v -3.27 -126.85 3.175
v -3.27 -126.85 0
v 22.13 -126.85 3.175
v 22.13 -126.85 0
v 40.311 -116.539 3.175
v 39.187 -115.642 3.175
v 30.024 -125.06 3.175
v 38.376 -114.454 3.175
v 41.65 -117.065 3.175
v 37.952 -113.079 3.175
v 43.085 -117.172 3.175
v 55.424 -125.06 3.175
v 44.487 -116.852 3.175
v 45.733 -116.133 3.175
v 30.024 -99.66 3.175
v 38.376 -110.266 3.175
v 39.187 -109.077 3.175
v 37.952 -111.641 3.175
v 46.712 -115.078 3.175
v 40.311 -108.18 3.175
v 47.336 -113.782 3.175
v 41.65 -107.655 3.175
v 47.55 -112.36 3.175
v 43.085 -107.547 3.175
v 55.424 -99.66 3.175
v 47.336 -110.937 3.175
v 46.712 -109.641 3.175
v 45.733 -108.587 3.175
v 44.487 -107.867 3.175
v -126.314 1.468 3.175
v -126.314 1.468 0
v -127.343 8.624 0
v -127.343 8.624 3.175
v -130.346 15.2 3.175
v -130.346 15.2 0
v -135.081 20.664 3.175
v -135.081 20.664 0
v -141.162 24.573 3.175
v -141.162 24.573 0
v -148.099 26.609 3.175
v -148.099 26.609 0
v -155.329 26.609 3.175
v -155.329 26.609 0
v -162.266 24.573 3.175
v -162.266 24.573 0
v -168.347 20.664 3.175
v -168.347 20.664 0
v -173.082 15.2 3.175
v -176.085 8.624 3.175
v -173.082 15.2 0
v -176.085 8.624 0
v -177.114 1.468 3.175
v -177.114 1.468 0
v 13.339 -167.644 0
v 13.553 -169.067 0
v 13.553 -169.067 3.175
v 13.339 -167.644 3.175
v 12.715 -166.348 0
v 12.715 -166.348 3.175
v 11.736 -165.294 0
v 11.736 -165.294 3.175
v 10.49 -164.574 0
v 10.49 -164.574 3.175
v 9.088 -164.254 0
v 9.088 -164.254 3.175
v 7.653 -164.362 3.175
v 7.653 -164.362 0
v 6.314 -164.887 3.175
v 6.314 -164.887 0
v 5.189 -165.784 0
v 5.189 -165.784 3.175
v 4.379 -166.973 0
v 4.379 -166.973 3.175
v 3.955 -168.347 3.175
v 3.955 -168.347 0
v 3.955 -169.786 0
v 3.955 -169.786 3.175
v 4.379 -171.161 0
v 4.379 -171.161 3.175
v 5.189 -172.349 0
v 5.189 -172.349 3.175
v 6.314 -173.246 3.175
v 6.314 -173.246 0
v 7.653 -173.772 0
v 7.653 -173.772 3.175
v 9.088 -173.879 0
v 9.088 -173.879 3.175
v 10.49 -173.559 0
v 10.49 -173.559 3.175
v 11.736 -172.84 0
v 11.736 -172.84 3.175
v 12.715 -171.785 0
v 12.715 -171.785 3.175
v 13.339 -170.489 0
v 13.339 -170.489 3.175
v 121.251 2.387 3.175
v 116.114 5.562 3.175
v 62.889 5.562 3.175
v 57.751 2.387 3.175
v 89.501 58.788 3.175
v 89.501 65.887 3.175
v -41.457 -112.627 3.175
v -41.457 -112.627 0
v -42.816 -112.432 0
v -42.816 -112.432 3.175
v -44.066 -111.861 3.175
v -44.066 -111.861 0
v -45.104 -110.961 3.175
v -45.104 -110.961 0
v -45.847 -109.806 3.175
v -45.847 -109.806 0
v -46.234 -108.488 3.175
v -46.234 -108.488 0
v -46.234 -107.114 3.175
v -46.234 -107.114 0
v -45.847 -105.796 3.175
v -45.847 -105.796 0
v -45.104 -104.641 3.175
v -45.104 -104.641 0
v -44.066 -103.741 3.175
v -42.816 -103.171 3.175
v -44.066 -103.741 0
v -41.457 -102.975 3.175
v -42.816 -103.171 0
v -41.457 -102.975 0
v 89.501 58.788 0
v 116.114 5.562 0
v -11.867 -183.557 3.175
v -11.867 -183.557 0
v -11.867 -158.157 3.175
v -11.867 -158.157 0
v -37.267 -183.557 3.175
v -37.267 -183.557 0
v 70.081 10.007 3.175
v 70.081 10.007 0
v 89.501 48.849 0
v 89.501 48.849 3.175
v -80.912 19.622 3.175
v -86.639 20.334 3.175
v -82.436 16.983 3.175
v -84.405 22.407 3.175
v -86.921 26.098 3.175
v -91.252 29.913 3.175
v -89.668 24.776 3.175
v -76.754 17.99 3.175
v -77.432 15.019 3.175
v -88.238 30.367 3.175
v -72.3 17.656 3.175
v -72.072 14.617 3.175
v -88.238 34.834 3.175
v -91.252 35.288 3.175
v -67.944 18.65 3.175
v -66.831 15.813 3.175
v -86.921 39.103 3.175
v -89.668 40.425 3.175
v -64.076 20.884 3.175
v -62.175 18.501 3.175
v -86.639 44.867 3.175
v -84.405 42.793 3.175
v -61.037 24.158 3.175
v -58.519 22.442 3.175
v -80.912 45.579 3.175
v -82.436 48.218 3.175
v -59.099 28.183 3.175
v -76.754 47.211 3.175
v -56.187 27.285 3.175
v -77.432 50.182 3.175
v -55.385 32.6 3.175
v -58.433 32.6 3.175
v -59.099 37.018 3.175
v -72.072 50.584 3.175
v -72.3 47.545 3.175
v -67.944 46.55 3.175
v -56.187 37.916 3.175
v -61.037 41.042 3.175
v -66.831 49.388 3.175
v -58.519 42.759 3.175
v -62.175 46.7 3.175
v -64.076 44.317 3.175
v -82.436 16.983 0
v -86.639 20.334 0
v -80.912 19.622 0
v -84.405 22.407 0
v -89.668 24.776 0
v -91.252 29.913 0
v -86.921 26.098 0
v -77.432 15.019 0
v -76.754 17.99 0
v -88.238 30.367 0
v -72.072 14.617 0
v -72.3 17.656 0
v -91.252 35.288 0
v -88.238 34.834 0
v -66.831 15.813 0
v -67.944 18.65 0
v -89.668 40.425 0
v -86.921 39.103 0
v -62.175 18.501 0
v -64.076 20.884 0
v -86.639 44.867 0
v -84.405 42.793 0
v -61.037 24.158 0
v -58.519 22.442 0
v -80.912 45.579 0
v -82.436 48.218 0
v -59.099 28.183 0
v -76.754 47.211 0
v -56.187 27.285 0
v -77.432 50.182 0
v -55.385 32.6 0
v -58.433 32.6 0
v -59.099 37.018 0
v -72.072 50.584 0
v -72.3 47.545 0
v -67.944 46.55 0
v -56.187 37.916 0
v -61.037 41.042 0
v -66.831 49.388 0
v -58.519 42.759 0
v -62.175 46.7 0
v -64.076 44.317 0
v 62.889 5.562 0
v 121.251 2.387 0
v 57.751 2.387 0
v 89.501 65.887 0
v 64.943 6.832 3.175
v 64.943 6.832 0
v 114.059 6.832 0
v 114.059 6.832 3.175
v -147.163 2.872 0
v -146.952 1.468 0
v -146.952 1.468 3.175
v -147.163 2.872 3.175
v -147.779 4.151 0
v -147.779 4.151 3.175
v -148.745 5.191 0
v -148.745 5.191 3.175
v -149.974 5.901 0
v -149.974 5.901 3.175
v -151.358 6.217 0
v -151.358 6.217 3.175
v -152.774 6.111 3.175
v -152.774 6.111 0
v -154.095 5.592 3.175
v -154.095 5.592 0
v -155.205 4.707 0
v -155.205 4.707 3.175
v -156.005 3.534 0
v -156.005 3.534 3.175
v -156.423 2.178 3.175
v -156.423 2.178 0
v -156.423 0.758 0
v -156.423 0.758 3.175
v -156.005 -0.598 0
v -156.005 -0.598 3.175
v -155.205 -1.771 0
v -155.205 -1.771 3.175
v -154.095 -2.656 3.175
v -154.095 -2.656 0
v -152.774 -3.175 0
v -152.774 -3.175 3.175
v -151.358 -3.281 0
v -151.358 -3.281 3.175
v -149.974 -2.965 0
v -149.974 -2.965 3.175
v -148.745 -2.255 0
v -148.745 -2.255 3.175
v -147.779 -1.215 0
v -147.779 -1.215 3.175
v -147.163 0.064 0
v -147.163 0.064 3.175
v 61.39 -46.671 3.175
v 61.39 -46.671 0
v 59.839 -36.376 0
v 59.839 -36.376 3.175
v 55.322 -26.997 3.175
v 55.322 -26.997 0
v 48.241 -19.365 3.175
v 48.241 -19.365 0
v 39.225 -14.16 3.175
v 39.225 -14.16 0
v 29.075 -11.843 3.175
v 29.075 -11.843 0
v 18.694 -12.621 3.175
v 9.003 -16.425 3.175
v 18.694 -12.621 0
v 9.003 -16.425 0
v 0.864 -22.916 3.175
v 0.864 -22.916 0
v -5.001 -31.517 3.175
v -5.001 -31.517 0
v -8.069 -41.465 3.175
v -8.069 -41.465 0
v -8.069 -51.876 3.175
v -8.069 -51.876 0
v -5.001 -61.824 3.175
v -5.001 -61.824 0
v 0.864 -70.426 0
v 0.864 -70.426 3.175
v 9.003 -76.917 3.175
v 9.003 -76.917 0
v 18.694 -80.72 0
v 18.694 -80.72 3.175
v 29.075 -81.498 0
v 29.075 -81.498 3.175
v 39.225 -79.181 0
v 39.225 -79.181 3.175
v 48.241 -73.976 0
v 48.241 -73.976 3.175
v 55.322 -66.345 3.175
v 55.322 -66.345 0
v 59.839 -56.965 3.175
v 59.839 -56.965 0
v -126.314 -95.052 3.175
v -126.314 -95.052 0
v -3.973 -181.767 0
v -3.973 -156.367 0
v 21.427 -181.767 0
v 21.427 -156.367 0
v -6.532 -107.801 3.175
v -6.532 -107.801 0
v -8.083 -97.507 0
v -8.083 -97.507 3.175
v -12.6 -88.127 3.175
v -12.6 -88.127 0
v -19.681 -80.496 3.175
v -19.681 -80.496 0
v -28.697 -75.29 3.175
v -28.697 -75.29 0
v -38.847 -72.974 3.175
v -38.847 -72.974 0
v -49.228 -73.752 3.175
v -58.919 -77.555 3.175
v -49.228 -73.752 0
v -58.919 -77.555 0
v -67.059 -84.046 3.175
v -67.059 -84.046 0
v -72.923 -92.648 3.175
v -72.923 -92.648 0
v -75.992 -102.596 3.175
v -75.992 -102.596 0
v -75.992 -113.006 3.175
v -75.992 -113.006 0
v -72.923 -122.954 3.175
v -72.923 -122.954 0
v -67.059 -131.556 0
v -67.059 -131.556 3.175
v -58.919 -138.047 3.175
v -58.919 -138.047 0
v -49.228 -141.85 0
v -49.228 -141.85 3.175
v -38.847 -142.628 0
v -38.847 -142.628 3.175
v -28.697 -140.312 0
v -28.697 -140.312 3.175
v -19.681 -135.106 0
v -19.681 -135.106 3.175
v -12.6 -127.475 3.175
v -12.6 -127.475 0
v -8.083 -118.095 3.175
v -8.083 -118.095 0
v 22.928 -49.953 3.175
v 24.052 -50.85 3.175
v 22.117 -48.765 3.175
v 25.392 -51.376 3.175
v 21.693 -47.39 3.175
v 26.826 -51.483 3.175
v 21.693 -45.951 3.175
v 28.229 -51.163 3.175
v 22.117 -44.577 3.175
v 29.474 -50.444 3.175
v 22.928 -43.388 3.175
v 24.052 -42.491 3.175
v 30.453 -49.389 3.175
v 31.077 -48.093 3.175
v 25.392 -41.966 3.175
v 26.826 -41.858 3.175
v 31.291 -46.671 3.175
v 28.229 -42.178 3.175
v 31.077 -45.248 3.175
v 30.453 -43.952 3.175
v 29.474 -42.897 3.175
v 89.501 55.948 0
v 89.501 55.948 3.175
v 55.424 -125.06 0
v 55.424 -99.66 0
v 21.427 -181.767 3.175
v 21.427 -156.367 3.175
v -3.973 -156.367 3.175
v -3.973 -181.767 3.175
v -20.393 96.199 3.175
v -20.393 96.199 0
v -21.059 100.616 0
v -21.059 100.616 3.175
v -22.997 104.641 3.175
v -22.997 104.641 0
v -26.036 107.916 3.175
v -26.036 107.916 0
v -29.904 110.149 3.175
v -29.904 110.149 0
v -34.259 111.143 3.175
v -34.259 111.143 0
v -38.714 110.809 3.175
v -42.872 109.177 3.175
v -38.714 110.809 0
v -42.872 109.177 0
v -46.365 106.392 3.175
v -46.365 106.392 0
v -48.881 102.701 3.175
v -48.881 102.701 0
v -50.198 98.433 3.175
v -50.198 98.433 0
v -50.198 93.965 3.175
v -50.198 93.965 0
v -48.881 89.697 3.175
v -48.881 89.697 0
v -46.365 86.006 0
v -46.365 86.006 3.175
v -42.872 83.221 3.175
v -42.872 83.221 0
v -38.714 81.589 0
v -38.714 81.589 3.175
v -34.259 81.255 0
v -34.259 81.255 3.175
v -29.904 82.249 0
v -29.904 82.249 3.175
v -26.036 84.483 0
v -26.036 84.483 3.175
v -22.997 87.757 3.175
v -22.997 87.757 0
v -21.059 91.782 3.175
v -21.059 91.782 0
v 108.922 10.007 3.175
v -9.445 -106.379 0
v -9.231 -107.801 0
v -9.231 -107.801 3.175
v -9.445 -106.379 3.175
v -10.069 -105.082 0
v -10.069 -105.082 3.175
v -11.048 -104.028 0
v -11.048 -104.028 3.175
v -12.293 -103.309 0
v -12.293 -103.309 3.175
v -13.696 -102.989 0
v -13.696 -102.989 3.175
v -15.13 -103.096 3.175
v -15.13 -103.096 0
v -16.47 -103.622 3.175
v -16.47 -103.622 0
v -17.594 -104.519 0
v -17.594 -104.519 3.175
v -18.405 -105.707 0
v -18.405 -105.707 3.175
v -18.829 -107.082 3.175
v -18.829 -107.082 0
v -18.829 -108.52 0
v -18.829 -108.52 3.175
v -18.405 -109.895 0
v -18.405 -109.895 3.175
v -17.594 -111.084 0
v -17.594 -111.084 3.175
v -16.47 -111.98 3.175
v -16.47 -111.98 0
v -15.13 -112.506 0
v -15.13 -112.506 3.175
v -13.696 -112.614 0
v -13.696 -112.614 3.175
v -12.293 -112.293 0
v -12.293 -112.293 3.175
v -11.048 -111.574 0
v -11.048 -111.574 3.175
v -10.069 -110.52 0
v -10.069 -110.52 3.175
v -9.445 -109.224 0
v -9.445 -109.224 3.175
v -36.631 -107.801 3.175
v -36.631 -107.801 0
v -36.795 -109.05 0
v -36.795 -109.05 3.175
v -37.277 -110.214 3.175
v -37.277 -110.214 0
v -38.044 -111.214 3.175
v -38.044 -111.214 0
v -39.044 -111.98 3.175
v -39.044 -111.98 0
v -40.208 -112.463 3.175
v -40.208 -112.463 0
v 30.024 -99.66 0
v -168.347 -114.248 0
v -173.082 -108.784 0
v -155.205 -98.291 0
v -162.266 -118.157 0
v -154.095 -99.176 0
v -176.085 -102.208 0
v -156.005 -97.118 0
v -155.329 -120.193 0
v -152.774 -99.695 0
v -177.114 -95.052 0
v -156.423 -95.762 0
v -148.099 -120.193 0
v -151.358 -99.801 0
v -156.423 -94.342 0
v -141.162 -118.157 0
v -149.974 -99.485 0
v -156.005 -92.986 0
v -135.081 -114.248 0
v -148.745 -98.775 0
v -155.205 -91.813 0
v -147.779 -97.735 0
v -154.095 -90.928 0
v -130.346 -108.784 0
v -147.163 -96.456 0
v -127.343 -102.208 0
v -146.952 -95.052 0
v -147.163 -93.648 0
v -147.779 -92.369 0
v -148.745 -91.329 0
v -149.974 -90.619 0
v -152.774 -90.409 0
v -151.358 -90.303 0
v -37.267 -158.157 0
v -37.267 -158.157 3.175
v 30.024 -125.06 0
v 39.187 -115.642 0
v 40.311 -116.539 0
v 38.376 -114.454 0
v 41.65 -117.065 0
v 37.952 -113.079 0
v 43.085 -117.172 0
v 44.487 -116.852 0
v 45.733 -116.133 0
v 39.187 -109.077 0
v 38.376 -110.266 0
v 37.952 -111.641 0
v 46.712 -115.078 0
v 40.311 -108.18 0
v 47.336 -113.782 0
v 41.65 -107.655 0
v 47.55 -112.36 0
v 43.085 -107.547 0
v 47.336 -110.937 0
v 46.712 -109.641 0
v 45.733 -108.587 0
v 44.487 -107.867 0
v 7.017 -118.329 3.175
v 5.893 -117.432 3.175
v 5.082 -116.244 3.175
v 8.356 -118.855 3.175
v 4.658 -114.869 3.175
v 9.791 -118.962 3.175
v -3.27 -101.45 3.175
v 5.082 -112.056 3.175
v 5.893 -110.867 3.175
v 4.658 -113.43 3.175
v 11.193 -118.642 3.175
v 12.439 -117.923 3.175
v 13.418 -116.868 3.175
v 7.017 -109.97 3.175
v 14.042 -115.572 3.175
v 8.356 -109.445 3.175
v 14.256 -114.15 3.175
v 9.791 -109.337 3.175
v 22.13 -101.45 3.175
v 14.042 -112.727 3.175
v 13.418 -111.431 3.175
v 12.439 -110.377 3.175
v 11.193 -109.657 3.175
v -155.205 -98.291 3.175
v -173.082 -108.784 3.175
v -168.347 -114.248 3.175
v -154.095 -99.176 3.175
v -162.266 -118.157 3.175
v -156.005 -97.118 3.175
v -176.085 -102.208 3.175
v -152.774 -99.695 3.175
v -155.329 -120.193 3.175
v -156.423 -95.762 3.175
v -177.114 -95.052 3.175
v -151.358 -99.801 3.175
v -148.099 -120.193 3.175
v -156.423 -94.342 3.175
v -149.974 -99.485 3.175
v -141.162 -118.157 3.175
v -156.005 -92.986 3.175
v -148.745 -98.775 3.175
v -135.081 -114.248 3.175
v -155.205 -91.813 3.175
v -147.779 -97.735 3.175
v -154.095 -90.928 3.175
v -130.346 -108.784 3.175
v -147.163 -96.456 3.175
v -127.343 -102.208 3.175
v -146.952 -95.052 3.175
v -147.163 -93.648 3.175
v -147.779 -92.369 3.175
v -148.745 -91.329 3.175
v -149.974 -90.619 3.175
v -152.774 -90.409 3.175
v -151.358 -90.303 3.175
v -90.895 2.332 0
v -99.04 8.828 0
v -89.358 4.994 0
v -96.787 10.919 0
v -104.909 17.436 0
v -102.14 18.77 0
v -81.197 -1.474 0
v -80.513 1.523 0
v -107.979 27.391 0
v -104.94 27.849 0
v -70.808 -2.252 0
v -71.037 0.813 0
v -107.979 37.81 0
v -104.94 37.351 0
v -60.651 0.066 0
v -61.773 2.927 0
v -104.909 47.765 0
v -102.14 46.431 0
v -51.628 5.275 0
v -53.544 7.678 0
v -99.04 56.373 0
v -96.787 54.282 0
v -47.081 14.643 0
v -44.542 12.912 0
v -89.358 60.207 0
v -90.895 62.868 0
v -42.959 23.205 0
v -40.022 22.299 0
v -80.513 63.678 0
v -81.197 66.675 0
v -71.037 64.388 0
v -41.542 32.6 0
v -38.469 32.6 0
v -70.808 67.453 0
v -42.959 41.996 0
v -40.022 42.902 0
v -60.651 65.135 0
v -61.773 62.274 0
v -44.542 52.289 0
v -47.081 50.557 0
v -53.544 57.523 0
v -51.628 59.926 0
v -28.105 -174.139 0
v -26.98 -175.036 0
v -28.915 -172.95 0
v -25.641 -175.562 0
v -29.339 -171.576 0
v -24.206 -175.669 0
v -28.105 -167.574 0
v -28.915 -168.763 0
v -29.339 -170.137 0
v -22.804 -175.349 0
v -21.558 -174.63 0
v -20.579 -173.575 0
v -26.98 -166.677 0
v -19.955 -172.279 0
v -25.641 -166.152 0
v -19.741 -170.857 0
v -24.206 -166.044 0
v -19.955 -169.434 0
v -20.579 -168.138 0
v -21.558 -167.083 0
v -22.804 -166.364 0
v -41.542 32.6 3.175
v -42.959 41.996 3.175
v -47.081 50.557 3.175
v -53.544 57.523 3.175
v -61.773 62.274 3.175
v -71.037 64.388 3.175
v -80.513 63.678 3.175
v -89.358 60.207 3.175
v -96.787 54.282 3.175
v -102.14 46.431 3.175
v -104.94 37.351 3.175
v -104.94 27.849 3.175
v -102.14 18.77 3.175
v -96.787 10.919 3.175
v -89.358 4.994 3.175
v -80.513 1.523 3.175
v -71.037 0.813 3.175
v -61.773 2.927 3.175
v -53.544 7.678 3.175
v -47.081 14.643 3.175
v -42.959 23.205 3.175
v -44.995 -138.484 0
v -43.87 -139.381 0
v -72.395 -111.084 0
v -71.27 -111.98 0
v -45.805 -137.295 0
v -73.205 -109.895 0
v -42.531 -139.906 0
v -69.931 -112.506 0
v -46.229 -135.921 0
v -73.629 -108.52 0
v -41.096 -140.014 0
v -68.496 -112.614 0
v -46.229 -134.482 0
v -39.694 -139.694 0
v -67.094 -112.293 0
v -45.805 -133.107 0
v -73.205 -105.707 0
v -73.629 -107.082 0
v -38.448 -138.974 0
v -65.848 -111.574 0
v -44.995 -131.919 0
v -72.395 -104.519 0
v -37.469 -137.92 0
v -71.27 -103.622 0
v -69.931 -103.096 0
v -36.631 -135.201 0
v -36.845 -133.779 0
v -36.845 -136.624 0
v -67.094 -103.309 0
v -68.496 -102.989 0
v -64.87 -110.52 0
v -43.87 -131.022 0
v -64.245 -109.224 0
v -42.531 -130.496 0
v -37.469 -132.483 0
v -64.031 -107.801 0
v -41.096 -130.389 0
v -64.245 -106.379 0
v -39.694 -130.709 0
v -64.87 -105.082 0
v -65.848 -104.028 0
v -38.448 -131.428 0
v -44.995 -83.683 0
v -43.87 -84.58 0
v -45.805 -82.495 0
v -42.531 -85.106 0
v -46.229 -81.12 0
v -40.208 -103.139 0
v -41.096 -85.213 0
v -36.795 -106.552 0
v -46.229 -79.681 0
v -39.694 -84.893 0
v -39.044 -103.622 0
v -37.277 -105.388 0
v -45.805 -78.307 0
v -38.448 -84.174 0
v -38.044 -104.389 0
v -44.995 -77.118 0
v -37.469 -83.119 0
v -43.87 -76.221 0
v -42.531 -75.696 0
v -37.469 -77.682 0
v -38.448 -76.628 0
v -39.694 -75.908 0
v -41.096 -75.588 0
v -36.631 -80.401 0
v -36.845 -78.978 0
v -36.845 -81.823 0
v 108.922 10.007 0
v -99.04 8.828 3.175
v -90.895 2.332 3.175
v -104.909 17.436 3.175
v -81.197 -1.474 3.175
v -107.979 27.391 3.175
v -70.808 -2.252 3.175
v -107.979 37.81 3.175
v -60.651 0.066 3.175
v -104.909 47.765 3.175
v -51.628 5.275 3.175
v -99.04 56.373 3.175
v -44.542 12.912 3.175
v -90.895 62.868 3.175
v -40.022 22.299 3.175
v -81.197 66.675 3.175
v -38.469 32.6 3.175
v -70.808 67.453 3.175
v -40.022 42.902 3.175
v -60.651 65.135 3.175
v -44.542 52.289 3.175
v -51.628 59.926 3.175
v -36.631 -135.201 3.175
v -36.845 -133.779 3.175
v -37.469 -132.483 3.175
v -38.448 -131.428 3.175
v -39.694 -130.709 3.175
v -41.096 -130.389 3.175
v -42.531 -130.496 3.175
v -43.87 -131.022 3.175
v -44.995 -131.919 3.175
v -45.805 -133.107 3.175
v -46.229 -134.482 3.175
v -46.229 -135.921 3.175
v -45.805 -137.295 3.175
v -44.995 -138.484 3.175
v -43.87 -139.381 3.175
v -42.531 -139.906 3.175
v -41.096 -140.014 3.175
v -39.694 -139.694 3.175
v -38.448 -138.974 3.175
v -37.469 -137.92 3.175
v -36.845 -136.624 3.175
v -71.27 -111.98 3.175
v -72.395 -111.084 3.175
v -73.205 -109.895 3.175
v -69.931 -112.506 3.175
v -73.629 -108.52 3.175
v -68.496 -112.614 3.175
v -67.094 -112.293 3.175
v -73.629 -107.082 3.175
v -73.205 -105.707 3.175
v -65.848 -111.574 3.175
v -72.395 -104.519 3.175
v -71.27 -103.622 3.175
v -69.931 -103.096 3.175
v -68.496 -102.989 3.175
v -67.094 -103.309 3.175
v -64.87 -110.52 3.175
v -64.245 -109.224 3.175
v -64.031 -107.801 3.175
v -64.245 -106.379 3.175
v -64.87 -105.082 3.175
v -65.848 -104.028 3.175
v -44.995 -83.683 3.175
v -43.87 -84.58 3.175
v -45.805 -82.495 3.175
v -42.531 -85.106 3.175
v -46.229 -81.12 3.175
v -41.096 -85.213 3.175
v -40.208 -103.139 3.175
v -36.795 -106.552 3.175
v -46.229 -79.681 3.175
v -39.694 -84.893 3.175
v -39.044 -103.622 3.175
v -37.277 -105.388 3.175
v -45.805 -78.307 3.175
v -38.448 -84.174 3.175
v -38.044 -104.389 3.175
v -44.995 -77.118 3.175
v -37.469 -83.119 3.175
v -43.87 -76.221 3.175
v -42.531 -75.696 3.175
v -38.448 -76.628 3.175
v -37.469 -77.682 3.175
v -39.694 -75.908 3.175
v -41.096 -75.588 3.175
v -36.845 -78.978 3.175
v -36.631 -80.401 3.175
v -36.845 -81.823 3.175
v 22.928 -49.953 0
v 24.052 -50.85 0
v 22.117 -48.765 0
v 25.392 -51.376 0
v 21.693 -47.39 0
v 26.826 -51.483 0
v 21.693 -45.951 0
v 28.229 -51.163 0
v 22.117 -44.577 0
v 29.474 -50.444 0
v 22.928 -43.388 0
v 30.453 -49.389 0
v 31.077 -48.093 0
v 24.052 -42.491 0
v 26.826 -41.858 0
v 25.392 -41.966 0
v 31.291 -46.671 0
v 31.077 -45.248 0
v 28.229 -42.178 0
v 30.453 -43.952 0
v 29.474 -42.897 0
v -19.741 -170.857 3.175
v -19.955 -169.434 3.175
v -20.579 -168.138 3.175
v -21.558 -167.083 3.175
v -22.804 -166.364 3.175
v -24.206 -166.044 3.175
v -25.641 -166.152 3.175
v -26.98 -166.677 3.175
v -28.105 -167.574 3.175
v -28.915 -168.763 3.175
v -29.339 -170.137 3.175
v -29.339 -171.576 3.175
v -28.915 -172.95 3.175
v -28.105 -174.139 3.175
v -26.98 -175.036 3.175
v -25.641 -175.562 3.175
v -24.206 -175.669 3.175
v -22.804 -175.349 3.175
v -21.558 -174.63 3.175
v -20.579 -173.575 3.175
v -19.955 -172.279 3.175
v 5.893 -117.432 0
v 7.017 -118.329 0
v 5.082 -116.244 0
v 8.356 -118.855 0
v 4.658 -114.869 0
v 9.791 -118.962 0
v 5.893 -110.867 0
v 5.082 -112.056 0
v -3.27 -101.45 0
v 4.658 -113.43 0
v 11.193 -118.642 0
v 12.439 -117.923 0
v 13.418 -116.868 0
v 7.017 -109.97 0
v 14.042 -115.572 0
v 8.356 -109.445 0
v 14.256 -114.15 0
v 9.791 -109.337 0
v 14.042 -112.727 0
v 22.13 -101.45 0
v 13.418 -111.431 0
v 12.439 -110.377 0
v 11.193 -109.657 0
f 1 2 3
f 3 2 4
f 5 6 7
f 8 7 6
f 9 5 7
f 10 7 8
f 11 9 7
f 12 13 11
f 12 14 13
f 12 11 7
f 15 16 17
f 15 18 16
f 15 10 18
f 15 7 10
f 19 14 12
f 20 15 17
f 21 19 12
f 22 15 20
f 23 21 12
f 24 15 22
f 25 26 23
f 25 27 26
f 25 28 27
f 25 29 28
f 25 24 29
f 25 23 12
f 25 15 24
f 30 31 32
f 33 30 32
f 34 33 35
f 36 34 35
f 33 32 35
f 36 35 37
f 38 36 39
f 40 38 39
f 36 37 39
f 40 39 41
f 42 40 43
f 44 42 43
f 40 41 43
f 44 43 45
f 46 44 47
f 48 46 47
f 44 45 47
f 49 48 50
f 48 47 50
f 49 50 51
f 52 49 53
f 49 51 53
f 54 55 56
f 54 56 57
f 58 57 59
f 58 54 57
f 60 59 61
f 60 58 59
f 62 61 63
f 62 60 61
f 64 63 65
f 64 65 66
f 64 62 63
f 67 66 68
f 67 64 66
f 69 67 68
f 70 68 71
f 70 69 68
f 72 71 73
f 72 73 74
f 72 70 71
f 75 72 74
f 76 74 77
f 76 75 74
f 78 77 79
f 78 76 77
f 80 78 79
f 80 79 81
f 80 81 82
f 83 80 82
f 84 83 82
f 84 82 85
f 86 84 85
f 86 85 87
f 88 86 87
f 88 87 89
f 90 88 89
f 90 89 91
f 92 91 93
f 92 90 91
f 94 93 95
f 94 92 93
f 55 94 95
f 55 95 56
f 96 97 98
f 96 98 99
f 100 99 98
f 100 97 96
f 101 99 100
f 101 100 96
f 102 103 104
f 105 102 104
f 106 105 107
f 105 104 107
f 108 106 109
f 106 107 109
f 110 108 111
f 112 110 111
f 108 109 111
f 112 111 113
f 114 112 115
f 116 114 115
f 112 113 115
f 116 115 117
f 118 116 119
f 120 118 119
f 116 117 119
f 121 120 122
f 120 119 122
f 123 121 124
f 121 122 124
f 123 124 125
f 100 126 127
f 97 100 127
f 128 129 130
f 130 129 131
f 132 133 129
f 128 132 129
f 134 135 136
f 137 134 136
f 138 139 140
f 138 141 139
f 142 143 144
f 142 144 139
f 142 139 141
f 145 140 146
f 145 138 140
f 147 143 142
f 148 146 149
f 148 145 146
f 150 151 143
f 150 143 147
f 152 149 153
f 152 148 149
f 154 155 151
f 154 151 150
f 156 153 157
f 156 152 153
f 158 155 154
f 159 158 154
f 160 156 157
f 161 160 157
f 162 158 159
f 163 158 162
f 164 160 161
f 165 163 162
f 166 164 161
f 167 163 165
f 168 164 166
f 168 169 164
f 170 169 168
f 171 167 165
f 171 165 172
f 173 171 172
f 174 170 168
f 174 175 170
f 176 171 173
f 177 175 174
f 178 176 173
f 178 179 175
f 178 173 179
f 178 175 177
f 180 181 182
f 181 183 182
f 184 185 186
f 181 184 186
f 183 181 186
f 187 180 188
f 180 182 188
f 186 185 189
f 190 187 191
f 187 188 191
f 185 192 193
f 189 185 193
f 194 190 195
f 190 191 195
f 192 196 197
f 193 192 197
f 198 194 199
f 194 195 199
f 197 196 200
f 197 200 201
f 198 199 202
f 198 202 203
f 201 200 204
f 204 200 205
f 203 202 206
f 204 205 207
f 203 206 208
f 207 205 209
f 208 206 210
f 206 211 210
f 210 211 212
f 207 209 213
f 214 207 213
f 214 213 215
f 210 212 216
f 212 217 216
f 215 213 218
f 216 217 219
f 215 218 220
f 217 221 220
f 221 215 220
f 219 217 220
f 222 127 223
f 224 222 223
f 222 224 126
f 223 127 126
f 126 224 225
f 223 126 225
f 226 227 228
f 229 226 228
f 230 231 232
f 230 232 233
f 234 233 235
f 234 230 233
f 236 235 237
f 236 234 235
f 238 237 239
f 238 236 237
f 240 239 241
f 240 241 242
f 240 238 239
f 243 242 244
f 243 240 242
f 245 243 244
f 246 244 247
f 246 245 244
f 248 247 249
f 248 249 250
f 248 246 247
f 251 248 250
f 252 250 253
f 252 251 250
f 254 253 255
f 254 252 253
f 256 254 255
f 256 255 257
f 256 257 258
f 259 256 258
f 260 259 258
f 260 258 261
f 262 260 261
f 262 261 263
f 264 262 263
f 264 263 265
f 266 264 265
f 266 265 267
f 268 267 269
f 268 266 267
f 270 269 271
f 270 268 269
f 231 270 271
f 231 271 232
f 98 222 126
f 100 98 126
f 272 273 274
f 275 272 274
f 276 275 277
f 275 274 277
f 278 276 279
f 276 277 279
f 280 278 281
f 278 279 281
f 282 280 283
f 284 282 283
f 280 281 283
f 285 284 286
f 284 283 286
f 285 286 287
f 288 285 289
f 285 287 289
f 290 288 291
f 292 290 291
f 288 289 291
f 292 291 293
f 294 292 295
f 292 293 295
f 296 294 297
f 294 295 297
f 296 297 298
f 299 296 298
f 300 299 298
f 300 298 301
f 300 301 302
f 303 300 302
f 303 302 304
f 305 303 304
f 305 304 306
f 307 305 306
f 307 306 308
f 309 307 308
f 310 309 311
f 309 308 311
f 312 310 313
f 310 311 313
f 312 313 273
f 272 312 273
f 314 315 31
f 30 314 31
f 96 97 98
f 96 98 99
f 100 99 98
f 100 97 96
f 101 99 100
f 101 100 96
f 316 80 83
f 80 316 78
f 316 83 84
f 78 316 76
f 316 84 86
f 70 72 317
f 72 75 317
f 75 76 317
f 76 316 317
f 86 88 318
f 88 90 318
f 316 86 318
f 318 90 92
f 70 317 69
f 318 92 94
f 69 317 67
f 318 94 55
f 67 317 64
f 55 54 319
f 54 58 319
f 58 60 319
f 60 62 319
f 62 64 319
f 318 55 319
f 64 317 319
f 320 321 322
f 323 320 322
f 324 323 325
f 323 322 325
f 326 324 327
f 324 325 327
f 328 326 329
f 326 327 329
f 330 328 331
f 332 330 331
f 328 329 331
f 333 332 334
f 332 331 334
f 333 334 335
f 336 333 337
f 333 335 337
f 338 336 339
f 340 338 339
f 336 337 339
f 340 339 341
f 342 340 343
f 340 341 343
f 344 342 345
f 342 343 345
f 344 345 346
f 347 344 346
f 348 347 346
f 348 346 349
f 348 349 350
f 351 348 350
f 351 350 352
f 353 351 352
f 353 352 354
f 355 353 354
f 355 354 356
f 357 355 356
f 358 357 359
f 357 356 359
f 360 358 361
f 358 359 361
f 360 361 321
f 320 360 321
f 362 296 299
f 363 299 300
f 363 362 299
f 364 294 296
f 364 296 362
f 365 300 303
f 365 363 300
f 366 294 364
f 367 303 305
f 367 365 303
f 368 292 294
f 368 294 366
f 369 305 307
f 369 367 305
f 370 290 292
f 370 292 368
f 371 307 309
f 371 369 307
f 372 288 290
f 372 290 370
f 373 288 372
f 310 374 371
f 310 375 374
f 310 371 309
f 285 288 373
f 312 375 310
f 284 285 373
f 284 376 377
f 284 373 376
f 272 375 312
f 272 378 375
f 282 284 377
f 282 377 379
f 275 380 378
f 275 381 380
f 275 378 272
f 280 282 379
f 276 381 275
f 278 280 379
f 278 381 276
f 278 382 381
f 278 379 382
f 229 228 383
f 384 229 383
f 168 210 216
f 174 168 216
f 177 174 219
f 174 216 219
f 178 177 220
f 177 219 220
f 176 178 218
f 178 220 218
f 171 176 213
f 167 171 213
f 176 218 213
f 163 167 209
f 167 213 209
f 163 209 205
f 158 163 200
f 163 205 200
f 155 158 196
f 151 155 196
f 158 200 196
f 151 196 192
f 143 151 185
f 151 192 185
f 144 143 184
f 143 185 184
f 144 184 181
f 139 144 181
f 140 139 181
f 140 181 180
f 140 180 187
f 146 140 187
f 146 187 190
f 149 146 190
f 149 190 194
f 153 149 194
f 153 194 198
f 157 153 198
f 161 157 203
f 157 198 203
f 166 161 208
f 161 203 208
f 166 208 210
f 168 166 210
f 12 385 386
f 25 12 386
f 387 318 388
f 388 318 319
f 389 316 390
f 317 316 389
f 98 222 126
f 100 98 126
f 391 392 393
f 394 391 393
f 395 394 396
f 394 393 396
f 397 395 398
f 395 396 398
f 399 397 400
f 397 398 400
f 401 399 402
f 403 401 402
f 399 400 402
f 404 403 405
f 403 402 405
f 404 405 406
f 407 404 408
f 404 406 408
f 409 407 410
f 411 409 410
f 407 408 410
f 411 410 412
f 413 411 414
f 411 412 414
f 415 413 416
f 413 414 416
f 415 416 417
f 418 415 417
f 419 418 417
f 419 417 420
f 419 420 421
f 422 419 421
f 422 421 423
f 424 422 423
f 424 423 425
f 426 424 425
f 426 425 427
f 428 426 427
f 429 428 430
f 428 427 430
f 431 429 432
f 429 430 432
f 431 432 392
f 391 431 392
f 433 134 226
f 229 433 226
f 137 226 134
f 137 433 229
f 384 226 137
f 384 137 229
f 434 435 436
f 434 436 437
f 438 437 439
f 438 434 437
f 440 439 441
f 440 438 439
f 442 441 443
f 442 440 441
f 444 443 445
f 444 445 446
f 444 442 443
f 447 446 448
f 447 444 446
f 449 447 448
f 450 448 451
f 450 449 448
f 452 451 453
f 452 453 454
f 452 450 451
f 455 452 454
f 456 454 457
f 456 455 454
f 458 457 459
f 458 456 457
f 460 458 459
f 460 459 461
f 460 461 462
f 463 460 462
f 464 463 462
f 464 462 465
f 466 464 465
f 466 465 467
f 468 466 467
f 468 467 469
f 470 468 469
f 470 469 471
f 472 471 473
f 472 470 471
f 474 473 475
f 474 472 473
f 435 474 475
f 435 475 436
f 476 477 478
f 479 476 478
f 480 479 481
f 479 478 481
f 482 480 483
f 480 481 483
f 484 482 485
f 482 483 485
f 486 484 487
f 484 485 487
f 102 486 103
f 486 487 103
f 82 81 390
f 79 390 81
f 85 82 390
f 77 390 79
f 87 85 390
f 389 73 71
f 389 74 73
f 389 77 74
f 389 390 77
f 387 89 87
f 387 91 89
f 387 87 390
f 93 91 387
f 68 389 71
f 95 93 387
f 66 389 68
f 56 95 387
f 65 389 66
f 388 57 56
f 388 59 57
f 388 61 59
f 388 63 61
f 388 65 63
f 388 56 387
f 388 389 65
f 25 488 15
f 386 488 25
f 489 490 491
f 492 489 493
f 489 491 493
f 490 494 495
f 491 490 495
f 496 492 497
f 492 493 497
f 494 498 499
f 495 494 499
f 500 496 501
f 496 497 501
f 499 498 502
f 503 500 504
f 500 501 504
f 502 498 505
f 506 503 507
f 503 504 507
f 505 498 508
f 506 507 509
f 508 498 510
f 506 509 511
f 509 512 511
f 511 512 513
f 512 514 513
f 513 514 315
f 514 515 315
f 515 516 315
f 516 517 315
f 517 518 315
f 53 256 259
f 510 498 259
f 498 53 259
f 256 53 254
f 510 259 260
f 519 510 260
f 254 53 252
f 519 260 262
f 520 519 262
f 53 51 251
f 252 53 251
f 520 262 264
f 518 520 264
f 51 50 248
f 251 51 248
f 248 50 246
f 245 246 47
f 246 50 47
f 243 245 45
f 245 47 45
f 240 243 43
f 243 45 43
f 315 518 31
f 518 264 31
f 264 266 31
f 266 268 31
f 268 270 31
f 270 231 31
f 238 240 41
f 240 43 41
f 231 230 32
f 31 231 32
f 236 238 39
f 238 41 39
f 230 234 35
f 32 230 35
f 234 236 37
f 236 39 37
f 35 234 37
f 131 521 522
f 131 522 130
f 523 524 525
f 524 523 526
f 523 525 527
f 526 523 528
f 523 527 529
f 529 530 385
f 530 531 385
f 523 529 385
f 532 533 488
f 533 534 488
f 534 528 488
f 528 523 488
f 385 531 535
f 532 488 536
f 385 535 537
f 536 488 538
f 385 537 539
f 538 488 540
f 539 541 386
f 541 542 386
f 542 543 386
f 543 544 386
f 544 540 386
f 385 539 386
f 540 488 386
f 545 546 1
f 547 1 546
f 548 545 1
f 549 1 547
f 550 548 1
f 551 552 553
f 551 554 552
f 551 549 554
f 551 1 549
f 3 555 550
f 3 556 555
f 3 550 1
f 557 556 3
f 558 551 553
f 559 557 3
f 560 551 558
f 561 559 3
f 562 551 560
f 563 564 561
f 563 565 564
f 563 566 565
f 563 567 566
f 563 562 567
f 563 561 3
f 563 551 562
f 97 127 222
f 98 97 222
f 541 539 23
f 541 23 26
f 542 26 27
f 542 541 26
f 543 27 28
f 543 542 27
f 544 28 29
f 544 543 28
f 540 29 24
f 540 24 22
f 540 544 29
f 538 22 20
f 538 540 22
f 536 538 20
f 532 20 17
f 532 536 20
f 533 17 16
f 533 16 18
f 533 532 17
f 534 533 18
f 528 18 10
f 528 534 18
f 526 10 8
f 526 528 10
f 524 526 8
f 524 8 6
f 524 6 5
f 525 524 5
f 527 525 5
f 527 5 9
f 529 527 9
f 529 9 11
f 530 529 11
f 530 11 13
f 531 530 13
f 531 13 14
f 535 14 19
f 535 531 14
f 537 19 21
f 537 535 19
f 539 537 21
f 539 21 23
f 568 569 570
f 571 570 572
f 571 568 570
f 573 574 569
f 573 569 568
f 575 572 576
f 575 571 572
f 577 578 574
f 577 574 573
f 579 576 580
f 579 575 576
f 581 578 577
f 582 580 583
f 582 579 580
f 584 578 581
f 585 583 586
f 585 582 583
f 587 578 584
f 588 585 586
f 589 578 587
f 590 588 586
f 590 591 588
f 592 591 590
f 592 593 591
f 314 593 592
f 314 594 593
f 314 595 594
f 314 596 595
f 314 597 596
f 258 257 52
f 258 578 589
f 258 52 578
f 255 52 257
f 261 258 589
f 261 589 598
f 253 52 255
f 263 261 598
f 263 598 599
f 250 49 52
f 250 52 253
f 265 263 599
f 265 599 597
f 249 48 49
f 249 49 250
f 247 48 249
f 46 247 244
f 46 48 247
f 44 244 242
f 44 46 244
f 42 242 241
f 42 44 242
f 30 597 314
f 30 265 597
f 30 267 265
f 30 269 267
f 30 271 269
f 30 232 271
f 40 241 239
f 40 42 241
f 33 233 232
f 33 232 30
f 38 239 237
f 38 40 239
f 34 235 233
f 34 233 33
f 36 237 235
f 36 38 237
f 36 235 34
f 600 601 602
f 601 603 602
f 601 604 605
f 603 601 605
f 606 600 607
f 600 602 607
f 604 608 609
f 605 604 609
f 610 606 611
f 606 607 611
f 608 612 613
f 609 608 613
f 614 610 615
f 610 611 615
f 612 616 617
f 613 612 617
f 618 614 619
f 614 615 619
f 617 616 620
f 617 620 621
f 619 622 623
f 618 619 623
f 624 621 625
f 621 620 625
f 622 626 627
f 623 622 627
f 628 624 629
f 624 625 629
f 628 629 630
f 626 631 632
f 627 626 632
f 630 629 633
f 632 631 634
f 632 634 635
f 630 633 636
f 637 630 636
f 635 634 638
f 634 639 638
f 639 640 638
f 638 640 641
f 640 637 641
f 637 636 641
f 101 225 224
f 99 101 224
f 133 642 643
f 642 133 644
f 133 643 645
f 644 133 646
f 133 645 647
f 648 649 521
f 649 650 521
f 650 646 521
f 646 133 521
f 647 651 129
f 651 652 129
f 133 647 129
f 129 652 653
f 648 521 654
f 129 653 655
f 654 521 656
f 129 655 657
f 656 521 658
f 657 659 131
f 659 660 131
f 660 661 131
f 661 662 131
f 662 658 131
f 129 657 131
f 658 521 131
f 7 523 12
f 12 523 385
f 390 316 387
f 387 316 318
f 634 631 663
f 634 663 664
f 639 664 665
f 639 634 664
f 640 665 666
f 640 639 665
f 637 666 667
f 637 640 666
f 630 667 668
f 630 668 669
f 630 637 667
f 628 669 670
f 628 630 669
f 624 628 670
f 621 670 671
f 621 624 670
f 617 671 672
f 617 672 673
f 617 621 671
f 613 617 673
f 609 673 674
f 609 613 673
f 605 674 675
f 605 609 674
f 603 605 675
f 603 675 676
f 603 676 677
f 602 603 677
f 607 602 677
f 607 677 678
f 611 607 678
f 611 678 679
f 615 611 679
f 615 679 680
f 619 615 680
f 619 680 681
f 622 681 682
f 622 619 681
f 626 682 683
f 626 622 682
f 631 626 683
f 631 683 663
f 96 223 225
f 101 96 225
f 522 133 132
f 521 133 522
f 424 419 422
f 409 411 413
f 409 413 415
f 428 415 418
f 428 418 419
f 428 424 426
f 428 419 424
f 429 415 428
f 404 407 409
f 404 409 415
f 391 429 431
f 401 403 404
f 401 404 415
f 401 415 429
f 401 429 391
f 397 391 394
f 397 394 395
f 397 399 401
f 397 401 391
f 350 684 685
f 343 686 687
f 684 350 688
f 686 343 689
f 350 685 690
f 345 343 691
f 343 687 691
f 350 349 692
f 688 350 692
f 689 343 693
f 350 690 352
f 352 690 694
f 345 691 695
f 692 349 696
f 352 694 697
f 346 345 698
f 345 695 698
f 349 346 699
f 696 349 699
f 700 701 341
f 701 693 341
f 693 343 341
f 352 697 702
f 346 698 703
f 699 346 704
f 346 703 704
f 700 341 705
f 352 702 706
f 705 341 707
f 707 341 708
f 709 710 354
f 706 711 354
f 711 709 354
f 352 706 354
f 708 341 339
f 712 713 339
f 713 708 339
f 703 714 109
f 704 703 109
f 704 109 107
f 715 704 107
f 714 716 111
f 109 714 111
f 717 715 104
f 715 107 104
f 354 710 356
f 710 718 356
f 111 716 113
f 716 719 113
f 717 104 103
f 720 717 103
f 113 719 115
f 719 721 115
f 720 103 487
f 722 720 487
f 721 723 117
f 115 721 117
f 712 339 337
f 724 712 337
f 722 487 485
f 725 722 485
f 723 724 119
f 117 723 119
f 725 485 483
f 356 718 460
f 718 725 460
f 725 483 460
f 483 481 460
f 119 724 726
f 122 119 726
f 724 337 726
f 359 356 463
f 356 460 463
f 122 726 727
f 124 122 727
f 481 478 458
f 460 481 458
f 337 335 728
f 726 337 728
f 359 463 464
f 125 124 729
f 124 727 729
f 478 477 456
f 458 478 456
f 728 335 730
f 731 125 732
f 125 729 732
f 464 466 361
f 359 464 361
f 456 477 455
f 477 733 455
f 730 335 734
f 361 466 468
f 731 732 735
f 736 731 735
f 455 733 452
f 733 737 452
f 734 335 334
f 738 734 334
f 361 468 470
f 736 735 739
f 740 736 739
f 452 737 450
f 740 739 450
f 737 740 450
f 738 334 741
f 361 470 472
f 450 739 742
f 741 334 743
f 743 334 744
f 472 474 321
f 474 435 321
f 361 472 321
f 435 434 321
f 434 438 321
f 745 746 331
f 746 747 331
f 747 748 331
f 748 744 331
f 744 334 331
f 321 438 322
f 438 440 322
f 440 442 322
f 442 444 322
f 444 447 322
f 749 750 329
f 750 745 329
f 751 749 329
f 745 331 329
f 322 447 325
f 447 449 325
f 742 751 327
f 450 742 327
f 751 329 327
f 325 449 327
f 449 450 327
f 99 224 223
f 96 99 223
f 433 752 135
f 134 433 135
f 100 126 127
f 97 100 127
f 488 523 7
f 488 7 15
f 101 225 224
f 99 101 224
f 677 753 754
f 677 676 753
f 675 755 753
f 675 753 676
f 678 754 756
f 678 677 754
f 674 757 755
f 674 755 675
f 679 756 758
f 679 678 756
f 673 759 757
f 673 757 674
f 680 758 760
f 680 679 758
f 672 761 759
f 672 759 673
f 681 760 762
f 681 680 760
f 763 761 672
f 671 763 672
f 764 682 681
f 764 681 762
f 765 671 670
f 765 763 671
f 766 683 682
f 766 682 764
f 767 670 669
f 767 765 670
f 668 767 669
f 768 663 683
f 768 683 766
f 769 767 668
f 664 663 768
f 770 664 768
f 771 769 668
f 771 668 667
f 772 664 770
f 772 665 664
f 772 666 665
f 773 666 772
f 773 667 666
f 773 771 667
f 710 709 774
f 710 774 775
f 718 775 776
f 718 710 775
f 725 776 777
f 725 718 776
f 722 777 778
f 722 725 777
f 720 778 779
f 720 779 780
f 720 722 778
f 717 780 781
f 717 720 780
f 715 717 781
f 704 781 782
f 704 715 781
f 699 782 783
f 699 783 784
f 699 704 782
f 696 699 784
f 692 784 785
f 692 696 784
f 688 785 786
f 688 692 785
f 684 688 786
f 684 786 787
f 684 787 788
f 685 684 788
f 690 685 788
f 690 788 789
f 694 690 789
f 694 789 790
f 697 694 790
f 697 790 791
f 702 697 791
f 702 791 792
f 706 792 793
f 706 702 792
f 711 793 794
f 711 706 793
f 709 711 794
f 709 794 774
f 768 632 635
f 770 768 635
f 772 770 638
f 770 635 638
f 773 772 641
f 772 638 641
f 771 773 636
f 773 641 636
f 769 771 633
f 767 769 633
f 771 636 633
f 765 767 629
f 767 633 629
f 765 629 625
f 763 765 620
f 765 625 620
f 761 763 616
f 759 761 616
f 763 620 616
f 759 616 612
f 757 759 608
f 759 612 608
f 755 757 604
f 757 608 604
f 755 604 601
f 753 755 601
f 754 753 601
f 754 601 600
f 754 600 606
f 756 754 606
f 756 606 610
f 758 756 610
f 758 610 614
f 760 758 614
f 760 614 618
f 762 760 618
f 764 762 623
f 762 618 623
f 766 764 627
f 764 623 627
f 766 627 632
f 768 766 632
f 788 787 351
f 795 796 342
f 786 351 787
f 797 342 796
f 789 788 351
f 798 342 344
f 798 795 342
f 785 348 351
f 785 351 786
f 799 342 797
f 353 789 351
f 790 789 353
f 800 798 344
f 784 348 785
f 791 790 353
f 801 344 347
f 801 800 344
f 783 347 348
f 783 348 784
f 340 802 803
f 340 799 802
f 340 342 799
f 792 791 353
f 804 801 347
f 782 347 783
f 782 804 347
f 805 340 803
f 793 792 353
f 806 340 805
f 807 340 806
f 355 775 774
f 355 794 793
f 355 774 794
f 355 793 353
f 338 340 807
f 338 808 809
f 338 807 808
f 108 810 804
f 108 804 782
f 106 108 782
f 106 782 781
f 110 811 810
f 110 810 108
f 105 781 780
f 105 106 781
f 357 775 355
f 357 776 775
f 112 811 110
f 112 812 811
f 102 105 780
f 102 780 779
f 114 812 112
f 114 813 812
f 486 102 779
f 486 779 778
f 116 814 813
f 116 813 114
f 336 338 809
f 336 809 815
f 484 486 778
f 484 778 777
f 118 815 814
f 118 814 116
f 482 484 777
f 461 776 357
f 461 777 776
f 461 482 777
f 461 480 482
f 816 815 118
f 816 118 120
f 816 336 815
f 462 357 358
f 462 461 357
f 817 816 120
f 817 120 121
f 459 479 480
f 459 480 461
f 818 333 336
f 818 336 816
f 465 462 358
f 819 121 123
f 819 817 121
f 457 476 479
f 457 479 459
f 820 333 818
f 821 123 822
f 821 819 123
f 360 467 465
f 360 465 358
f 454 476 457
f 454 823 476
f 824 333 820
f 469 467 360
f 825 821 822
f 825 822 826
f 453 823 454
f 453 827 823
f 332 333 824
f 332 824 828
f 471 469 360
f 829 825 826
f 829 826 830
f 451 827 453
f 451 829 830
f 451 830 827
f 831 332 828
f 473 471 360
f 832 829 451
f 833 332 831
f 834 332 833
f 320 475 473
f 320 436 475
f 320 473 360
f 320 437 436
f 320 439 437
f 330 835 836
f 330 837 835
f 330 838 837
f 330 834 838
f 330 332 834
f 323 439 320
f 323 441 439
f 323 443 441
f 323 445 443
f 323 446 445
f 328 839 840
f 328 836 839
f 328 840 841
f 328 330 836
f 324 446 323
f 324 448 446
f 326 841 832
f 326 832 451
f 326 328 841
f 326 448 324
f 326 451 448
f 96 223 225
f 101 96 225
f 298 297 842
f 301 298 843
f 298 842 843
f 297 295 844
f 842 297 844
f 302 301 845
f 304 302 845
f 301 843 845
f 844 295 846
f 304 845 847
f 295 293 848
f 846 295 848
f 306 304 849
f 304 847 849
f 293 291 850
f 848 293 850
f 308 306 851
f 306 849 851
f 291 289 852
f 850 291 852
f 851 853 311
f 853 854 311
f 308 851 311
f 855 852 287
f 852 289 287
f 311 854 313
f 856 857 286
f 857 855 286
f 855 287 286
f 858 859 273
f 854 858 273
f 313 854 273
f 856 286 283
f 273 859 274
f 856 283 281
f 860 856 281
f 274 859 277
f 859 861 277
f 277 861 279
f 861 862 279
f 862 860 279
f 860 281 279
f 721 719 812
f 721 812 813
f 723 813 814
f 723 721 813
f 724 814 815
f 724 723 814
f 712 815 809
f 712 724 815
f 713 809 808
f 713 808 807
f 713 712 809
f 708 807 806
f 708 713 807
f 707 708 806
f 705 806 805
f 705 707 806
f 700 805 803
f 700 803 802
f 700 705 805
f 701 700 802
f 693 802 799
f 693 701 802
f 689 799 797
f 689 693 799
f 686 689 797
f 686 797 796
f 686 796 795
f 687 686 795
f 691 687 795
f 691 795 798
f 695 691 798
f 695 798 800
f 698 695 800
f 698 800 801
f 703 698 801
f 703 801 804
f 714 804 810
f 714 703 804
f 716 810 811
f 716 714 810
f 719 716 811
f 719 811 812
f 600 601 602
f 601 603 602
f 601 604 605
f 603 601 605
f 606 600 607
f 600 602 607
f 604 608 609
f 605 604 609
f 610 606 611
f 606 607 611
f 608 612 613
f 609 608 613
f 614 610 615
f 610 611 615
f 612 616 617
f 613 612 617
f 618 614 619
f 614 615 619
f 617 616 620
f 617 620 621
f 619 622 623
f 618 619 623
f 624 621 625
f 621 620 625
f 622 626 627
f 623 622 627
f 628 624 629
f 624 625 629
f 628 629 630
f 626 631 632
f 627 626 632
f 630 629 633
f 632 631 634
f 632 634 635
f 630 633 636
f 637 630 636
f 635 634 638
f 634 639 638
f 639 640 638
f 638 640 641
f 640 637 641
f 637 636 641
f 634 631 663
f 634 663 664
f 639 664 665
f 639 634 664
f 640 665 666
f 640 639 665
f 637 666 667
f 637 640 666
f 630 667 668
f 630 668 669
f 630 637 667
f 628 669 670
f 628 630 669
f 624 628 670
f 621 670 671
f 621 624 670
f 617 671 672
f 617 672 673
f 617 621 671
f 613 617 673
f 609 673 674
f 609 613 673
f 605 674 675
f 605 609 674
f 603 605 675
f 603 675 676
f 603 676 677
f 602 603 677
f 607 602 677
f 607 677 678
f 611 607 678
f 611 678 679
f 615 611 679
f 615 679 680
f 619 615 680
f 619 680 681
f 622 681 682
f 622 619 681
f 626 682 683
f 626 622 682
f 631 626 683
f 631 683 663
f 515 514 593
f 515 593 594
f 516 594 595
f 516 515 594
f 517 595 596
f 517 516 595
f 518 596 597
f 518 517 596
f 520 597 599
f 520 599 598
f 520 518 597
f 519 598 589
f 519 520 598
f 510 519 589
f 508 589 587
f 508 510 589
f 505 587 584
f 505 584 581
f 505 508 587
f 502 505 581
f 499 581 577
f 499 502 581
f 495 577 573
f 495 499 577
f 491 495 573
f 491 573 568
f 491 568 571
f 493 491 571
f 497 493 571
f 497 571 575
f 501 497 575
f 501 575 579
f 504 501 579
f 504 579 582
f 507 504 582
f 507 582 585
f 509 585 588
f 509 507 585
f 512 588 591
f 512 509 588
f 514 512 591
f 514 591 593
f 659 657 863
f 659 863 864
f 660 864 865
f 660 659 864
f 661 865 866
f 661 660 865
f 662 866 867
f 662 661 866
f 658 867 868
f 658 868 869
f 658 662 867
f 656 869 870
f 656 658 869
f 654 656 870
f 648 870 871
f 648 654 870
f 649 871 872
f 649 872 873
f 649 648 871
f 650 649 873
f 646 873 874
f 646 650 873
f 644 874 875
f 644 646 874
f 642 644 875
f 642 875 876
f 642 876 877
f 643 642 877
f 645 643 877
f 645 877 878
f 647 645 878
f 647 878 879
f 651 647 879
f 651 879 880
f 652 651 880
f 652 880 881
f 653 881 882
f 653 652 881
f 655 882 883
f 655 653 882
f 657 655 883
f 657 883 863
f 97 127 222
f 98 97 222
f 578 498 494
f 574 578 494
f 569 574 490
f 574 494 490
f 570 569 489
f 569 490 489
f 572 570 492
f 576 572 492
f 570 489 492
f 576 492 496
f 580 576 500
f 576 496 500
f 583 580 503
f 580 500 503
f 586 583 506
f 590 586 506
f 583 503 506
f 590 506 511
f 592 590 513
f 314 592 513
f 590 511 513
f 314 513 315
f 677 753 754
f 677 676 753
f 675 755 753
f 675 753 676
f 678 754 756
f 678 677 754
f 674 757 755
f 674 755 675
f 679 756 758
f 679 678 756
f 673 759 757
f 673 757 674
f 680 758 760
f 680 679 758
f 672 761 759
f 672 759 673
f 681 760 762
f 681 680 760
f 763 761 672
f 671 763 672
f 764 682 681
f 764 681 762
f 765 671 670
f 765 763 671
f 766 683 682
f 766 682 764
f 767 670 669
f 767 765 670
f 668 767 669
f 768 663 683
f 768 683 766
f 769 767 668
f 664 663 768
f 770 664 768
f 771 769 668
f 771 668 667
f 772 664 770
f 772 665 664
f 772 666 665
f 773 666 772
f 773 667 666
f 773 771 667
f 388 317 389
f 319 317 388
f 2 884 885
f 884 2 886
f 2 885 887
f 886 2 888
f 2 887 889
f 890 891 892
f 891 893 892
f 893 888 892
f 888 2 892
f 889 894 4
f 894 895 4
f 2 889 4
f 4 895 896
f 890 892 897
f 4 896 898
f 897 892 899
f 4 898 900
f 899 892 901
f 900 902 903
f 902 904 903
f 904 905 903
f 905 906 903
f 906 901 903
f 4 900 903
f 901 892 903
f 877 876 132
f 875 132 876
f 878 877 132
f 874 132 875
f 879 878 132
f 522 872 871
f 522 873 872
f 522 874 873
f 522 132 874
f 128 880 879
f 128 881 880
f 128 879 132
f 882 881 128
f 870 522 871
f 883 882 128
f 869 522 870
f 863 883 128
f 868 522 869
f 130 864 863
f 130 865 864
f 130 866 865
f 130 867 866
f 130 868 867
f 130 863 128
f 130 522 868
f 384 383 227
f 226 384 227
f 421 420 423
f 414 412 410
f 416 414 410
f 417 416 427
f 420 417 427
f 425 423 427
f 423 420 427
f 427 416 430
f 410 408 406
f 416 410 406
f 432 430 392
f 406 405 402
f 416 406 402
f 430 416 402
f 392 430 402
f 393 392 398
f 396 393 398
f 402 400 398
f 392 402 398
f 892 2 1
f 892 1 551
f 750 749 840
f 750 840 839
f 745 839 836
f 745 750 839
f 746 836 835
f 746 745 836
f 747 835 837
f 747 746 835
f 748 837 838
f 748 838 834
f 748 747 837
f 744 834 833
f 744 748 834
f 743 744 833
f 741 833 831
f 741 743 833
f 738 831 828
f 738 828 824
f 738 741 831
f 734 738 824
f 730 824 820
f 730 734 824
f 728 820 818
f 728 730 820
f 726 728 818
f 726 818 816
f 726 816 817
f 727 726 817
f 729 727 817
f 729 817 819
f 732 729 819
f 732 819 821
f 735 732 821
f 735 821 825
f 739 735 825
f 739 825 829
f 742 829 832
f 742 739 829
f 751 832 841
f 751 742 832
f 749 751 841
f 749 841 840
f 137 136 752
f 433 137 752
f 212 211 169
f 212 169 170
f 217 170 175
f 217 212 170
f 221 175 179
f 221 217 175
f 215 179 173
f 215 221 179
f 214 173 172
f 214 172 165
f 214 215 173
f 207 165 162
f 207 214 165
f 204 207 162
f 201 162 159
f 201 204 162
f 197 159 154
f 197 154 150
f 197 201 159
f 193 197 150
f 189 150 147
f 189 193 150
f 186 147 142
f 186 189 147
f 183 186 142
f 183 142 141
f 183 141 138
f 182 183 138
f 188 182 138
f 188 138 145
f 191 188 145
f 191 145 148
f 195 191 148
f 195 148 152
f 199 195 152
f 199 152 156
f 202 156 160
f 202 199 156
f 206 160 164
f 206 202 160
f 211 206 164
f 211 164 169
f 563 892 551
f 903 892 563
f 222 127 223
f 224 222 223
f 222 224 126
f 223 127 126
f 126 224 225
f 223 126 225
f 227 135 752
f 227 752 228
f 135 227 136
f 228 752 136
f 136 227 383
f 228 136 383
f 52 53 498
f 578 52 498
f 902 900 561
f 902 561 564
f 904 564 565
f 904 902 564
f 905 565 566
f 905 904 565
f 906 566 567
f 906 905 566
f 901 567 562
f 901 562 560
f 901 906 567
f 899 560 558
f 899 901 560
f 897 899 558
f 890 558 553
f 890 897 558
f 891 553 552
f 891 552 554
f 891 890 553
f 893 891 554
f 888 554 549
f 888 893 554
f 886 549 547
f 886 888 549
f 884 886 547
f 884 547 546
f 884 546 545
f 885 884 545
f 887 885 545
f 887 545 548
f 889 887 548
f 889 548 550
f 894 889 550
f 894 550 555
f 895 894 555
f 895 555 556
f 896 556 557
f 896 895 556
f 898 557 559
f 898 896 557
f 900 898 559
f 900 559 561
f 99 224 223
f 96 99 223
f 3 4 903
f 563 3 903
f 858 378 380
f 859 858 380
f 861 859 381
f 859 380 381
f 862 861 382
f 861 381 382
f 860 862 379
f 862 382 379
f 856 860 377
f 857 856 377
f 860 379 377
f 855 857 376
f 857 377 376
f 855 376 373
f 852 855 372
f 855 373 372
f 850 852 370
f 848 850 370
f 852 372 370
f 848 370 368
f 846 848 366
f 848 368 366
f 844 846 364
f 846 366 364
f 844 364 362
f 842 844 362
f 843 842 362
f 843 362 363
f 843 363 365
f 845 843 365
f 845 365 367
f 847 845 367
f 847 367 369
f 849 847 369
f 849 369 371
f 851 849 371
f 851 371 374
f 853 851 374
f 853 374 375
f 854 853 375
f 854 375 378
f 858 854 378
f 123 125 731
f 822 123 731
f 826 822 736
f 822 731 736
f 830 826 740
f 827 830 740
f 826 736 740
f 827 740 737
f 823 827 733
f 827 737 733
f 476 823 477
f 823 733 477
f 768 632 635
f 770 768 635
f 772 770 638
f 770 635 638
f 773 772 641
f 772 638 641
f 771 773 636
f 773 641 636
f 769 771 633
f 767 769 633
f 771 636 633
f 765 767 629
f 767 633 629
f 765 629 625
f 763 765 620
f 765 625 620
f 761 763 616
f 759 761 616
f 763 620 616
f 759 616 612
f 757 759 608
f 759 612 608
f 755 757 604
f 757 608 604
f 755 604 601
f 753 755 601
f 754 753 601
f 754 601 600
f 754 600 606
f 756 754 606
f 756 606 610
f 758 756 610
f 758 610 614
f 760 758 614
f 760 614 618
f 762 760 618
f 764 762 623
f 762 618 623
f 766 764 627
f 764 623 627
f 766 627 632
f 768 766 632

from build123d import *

# Parameters (mm, degrees)
F1_R      = 34.925
F1_R_2    = 4.826
F2_DEPTH  = 3.175
F3_R      = 34.925
F4_DEPTH  = 3.175
F5_R      = 4.826
F6_DEPTH  = 25.4
F7_W      = 25.4
F7_H      = 25.4
F7_R      = 4.826
F8_DEPTH  = 3.175
F0_R      = 18.034
F0_R_2    = 14.986
F9_DEPTH  = 3.175
F0_R_3    = 34.9504
F0_R_4    = 31.877
F10_R     = 4.7625
F11_DEPTH = 3.175
F12_DEPTH = 3.175
F13_DEPTH = 3.175


# Not quite as in the source:
# - a feature names something its author has since deleted; it is built from what else it names


with BuildPart() as f2:
    # F1 (on Top) → F2 (new body)
    with BuildSketch(Plane.XY):
        with Locations((-41.45681113, -107.801027596)):
            Circle(F1_R)
        with Locations((-41.45681113, -135.201277596)):
            Circle(F1_R_2, mode=Mode.SUBTRACT)
        with Locations((-68.85706113, -107.801027596)):
            Circle(F1_R_2, mode=Mode.SUBTRACT)
        with BuildLine():
            ThreePointArc((-41.45681113, -102.975027596), (-38.044313804, -104.38853027), (-36.63081113, -107.801027596))
            ThreePointArc((-36.63081113, -107.801027596), (-38.044313804, -111.213524922), (-41.45681113, -112.627027596))
            ThreePointArc((-41.45681113, -112.627027596), (-46.28281113, -107.801027596), (-41.45681113, -102.975027596))
        make_face(mode=Mode.SUBTRACT)
        with Locations((-14.05656113, -107.801027596)):
            Circle(F1_R_2, mode=Mode.SUBTRACT)
        with Locations((-41.45681113, -80.400777596)):
            Circle(F1_R_2, mode=Mode.SUBTRACT)
    extrude(amount=F2_DEPTH)


with BuildPart() as f4:
    # F3 (on Top) → F4 (new body)
    with BuildSketch(Plane.XY):
        with Locations((26.4654487837, -46.6705858707)):
            Circle(F3_R)
    extrude(amount=F4_DEPTH)

    # F5 (on face) → F6 (cut)
    with BuildSketch(Plane.XY.offset(3.175)):
        with Locations((26.4654487837, -46.6705858707)):
            Circle(F5_R)
    extrude(amount=-F6_DEPTH, mode=Mode.SUBTRACT)


with BuildPart() as f8:
    # F7 (on Top) → F8 (new body)
    with BuildSketch(Plane.XY):
        with Locations((9.4302088464, -114.1496481273)):
            Rectangle(F7_W, F7_H)
        with Locations((9.4302088464, -114.1496481273)):
            Circle(F7_R, mode=Mode.SUBTRACT)
    extrude(amount=F8_DEPTH)

    # F7 (on Top) → F12 (join)
    with BuildSketch(Plane.XY):
        with Locations((9.4302088464, -114.1496481273)):
            Rectangle(F7_W, F7_H)
        with Locations((9.4302088464, -114.1496481273)):
            Circle(F7_R, mode=Mode.SUBTRACT)
    extrude(amount=F12_DEPTH)


with BuildPart() as f9:
    # F0 (on Top) → F9 (new body)
    with BuildSketch(Plane.XY):
        with Locations((-73.4194368124, 32.6004140079)):
            Circle(F0_R)
        with Locations((-73.4194368124, 32.6004140079)):
            Circle(F0_R_2, mode=Mode.SUBTRACT)
    extrude(amount=F9_DEPTH)


with BuildPart() as f9b:
    # F0 (on Top) → F9, piece 2 (new body)
    with BuildSketch(Plane.XY):
        with Locations((-73.4194368124, 32.6004140079)):
            Circle(F0_R_3)
        with Locations((-73.4194368124, 32.6004140079)):
            Circle(F0_R_4, mode=Mode.SUBTRACT)
    extrude(amount=F9_DEPTH)


with BuildPart() as f9c:
    # F0 (on Top) → F9, piece 3 (new body)
    with BuildSketch(Plane.XY):
        Polygon((89.5012710243, 65.8874005459), (57.7512710243, 2.3874005459), (89.5012710243, 2.3874005459), (121.2512710243, 2.3874005459), align=None)
        Polygon((116.1140131101, 5.5624005459), (89.5012710243, 5.5624005459), (62.8885289386, 5.5624005459), (89.5012710243, 58.7878847174), align=None, mode=Mode.SUBTRACT)
    extrude(amount=F9_DEPTH)


with BuildPart() as f9d:
    # F0 (on Top) → F9, piece 4 (new body)
    with BuildSketch(Plane.XY):
        Polygon((89.5012710243, 55.948078386), (64.9434321043, 6.8324005459), (89.5012710243, 6.8324005459), (114.0591099444, 6.8324005459), align=None)
        Polygon((108.9218520301, 10.0074005459), (89.5012710243, 10.0074005459), (70.0806900186, 10.0074005459), (89.5012710243, 48.8485625574), align=None, mode=Mode.SUBTRACT)
    extrude(amount=F9_DEPTH)


with BuildPart() as f11:
    # F10 (on Top) → F11 (new body)
    with BuildSketch(Plane.XY):
        with BuildLine():
            Line((-126.3140311956, -95.0520038605), (-126.3140311956, 1.4679961395))
            ThreePointArc((-126.3140311956, 1.4679961395), (-151.7140311956, 26.8679961395), (-177.1140311956, 1.4679961395))
            Line((-177.1140311956, 1.4679961395), (-177.1140311956, -95.0520038605))
            ThreePointArc((-177.1140311956, -95.0520038605), (-151.7140311956, -120.4520038605), (-126.3140311956, -95.0520038605))
        make_face()
        with Locations((-151.7140311956, -95.0520038605)):
            Circle(F10_R, mode=Mode.SUBTRACT)
        with Locations((-151.7140311956, 1.4679961395)):
            Circle(F10_R, mode=Mode.SUBTRACT)
    extrude(amount=F11_DEPTH)


with BuildPart() as f12:
    # F7 (on Top) → F12, piece 2 (new body)
    with BuildSketch(Plane.XY):
        with Locations((42.7242840971, -112.3598849141)):
            Rectangle(F7_W, F7_H)
        with Locations((42.7242840971, -112.3598849141)):
            Circle(F7_R, mode=Mode.SUBTRACT)
    extrude(amount=F12_DEPTH)


with BuildPart() as f12b:
    # F7 (on Top) → F12, piece 3 (new body)
    with BuildSketch(Plane.XY):
        with Locations((-24.5669036167, -170.8565043216)):
            Rectangle(F7_W, F7_H)
        with Locations((-24.5669036167, -170.8565043216)):
            Circle(F7_R, mode=Mode.SUBTRACT)
    extrude(amount=F12_DEPTH)


with BuildPart() as f12c:
    # F7 (on Top) → F12, piece 4 (new body)
    with BuildSketch(Plane.XY):
        with Locations((8.7271716339, -169.0667411084)):
            Rectangle(F7_W, F7_H)
        with Locations((8.7271716339, -169.0667411084)):
            Circle(F7_R, mode=Mode.SUBTRACT)
    extrude(amount=F12_DEPTH)


with BuildPart() as f13:
    # F0 (on Top) → F13 (new body)
    with BuildSketch(Plane.XY):
        Polygon((89.5012710243, 65.8874005459), (57.7512710243, 2.3874005459), (89.5012710243, 2.3874005459), (121.2512710243, 2.3874005459), align=None)
        Polygon((116.1140131101, 5.5624005459), (89.5012710243, 5.5624005459), (62.8885289386, 5.5624005459), (89.5012710243, 58.7878847174), align=None, mode=Mode.SUBTRACT)
    extrude(amount=F13_DEPTH)


with BuildPart() as f13b:
    # F0 (on Top) → F13, piece 2 (new body)
    with BuildSketch(Plane.XY):
        with Locations((-73.4194368124, 32.6004140079)):
            Circle(F0_R_3)
        with Locations((-73.4194368124, 32.6004140079)):
            Circle(F0_R_4, mode=Mode.SUBTRACT)
    extrude(amount=F13_DEPTH)


with BuildPart() as f13c:
    # F0 (on Top) → F13, piece 3 (new body)
    with BuildSketch(Plane.XY):
        with Locations((-35.3792831302, 96.1990430951)):
            Circle(F0_R_2)
    extrude(amount=F13_DEPTH)


solid = Compound([f2.part, f4.part, f8.part, f9.part, f9b.part, f9c.part, f9d.part, f11.part, f12.part, f12b.part, f12c.part, f13.part, f13b.part, f13c.part])
